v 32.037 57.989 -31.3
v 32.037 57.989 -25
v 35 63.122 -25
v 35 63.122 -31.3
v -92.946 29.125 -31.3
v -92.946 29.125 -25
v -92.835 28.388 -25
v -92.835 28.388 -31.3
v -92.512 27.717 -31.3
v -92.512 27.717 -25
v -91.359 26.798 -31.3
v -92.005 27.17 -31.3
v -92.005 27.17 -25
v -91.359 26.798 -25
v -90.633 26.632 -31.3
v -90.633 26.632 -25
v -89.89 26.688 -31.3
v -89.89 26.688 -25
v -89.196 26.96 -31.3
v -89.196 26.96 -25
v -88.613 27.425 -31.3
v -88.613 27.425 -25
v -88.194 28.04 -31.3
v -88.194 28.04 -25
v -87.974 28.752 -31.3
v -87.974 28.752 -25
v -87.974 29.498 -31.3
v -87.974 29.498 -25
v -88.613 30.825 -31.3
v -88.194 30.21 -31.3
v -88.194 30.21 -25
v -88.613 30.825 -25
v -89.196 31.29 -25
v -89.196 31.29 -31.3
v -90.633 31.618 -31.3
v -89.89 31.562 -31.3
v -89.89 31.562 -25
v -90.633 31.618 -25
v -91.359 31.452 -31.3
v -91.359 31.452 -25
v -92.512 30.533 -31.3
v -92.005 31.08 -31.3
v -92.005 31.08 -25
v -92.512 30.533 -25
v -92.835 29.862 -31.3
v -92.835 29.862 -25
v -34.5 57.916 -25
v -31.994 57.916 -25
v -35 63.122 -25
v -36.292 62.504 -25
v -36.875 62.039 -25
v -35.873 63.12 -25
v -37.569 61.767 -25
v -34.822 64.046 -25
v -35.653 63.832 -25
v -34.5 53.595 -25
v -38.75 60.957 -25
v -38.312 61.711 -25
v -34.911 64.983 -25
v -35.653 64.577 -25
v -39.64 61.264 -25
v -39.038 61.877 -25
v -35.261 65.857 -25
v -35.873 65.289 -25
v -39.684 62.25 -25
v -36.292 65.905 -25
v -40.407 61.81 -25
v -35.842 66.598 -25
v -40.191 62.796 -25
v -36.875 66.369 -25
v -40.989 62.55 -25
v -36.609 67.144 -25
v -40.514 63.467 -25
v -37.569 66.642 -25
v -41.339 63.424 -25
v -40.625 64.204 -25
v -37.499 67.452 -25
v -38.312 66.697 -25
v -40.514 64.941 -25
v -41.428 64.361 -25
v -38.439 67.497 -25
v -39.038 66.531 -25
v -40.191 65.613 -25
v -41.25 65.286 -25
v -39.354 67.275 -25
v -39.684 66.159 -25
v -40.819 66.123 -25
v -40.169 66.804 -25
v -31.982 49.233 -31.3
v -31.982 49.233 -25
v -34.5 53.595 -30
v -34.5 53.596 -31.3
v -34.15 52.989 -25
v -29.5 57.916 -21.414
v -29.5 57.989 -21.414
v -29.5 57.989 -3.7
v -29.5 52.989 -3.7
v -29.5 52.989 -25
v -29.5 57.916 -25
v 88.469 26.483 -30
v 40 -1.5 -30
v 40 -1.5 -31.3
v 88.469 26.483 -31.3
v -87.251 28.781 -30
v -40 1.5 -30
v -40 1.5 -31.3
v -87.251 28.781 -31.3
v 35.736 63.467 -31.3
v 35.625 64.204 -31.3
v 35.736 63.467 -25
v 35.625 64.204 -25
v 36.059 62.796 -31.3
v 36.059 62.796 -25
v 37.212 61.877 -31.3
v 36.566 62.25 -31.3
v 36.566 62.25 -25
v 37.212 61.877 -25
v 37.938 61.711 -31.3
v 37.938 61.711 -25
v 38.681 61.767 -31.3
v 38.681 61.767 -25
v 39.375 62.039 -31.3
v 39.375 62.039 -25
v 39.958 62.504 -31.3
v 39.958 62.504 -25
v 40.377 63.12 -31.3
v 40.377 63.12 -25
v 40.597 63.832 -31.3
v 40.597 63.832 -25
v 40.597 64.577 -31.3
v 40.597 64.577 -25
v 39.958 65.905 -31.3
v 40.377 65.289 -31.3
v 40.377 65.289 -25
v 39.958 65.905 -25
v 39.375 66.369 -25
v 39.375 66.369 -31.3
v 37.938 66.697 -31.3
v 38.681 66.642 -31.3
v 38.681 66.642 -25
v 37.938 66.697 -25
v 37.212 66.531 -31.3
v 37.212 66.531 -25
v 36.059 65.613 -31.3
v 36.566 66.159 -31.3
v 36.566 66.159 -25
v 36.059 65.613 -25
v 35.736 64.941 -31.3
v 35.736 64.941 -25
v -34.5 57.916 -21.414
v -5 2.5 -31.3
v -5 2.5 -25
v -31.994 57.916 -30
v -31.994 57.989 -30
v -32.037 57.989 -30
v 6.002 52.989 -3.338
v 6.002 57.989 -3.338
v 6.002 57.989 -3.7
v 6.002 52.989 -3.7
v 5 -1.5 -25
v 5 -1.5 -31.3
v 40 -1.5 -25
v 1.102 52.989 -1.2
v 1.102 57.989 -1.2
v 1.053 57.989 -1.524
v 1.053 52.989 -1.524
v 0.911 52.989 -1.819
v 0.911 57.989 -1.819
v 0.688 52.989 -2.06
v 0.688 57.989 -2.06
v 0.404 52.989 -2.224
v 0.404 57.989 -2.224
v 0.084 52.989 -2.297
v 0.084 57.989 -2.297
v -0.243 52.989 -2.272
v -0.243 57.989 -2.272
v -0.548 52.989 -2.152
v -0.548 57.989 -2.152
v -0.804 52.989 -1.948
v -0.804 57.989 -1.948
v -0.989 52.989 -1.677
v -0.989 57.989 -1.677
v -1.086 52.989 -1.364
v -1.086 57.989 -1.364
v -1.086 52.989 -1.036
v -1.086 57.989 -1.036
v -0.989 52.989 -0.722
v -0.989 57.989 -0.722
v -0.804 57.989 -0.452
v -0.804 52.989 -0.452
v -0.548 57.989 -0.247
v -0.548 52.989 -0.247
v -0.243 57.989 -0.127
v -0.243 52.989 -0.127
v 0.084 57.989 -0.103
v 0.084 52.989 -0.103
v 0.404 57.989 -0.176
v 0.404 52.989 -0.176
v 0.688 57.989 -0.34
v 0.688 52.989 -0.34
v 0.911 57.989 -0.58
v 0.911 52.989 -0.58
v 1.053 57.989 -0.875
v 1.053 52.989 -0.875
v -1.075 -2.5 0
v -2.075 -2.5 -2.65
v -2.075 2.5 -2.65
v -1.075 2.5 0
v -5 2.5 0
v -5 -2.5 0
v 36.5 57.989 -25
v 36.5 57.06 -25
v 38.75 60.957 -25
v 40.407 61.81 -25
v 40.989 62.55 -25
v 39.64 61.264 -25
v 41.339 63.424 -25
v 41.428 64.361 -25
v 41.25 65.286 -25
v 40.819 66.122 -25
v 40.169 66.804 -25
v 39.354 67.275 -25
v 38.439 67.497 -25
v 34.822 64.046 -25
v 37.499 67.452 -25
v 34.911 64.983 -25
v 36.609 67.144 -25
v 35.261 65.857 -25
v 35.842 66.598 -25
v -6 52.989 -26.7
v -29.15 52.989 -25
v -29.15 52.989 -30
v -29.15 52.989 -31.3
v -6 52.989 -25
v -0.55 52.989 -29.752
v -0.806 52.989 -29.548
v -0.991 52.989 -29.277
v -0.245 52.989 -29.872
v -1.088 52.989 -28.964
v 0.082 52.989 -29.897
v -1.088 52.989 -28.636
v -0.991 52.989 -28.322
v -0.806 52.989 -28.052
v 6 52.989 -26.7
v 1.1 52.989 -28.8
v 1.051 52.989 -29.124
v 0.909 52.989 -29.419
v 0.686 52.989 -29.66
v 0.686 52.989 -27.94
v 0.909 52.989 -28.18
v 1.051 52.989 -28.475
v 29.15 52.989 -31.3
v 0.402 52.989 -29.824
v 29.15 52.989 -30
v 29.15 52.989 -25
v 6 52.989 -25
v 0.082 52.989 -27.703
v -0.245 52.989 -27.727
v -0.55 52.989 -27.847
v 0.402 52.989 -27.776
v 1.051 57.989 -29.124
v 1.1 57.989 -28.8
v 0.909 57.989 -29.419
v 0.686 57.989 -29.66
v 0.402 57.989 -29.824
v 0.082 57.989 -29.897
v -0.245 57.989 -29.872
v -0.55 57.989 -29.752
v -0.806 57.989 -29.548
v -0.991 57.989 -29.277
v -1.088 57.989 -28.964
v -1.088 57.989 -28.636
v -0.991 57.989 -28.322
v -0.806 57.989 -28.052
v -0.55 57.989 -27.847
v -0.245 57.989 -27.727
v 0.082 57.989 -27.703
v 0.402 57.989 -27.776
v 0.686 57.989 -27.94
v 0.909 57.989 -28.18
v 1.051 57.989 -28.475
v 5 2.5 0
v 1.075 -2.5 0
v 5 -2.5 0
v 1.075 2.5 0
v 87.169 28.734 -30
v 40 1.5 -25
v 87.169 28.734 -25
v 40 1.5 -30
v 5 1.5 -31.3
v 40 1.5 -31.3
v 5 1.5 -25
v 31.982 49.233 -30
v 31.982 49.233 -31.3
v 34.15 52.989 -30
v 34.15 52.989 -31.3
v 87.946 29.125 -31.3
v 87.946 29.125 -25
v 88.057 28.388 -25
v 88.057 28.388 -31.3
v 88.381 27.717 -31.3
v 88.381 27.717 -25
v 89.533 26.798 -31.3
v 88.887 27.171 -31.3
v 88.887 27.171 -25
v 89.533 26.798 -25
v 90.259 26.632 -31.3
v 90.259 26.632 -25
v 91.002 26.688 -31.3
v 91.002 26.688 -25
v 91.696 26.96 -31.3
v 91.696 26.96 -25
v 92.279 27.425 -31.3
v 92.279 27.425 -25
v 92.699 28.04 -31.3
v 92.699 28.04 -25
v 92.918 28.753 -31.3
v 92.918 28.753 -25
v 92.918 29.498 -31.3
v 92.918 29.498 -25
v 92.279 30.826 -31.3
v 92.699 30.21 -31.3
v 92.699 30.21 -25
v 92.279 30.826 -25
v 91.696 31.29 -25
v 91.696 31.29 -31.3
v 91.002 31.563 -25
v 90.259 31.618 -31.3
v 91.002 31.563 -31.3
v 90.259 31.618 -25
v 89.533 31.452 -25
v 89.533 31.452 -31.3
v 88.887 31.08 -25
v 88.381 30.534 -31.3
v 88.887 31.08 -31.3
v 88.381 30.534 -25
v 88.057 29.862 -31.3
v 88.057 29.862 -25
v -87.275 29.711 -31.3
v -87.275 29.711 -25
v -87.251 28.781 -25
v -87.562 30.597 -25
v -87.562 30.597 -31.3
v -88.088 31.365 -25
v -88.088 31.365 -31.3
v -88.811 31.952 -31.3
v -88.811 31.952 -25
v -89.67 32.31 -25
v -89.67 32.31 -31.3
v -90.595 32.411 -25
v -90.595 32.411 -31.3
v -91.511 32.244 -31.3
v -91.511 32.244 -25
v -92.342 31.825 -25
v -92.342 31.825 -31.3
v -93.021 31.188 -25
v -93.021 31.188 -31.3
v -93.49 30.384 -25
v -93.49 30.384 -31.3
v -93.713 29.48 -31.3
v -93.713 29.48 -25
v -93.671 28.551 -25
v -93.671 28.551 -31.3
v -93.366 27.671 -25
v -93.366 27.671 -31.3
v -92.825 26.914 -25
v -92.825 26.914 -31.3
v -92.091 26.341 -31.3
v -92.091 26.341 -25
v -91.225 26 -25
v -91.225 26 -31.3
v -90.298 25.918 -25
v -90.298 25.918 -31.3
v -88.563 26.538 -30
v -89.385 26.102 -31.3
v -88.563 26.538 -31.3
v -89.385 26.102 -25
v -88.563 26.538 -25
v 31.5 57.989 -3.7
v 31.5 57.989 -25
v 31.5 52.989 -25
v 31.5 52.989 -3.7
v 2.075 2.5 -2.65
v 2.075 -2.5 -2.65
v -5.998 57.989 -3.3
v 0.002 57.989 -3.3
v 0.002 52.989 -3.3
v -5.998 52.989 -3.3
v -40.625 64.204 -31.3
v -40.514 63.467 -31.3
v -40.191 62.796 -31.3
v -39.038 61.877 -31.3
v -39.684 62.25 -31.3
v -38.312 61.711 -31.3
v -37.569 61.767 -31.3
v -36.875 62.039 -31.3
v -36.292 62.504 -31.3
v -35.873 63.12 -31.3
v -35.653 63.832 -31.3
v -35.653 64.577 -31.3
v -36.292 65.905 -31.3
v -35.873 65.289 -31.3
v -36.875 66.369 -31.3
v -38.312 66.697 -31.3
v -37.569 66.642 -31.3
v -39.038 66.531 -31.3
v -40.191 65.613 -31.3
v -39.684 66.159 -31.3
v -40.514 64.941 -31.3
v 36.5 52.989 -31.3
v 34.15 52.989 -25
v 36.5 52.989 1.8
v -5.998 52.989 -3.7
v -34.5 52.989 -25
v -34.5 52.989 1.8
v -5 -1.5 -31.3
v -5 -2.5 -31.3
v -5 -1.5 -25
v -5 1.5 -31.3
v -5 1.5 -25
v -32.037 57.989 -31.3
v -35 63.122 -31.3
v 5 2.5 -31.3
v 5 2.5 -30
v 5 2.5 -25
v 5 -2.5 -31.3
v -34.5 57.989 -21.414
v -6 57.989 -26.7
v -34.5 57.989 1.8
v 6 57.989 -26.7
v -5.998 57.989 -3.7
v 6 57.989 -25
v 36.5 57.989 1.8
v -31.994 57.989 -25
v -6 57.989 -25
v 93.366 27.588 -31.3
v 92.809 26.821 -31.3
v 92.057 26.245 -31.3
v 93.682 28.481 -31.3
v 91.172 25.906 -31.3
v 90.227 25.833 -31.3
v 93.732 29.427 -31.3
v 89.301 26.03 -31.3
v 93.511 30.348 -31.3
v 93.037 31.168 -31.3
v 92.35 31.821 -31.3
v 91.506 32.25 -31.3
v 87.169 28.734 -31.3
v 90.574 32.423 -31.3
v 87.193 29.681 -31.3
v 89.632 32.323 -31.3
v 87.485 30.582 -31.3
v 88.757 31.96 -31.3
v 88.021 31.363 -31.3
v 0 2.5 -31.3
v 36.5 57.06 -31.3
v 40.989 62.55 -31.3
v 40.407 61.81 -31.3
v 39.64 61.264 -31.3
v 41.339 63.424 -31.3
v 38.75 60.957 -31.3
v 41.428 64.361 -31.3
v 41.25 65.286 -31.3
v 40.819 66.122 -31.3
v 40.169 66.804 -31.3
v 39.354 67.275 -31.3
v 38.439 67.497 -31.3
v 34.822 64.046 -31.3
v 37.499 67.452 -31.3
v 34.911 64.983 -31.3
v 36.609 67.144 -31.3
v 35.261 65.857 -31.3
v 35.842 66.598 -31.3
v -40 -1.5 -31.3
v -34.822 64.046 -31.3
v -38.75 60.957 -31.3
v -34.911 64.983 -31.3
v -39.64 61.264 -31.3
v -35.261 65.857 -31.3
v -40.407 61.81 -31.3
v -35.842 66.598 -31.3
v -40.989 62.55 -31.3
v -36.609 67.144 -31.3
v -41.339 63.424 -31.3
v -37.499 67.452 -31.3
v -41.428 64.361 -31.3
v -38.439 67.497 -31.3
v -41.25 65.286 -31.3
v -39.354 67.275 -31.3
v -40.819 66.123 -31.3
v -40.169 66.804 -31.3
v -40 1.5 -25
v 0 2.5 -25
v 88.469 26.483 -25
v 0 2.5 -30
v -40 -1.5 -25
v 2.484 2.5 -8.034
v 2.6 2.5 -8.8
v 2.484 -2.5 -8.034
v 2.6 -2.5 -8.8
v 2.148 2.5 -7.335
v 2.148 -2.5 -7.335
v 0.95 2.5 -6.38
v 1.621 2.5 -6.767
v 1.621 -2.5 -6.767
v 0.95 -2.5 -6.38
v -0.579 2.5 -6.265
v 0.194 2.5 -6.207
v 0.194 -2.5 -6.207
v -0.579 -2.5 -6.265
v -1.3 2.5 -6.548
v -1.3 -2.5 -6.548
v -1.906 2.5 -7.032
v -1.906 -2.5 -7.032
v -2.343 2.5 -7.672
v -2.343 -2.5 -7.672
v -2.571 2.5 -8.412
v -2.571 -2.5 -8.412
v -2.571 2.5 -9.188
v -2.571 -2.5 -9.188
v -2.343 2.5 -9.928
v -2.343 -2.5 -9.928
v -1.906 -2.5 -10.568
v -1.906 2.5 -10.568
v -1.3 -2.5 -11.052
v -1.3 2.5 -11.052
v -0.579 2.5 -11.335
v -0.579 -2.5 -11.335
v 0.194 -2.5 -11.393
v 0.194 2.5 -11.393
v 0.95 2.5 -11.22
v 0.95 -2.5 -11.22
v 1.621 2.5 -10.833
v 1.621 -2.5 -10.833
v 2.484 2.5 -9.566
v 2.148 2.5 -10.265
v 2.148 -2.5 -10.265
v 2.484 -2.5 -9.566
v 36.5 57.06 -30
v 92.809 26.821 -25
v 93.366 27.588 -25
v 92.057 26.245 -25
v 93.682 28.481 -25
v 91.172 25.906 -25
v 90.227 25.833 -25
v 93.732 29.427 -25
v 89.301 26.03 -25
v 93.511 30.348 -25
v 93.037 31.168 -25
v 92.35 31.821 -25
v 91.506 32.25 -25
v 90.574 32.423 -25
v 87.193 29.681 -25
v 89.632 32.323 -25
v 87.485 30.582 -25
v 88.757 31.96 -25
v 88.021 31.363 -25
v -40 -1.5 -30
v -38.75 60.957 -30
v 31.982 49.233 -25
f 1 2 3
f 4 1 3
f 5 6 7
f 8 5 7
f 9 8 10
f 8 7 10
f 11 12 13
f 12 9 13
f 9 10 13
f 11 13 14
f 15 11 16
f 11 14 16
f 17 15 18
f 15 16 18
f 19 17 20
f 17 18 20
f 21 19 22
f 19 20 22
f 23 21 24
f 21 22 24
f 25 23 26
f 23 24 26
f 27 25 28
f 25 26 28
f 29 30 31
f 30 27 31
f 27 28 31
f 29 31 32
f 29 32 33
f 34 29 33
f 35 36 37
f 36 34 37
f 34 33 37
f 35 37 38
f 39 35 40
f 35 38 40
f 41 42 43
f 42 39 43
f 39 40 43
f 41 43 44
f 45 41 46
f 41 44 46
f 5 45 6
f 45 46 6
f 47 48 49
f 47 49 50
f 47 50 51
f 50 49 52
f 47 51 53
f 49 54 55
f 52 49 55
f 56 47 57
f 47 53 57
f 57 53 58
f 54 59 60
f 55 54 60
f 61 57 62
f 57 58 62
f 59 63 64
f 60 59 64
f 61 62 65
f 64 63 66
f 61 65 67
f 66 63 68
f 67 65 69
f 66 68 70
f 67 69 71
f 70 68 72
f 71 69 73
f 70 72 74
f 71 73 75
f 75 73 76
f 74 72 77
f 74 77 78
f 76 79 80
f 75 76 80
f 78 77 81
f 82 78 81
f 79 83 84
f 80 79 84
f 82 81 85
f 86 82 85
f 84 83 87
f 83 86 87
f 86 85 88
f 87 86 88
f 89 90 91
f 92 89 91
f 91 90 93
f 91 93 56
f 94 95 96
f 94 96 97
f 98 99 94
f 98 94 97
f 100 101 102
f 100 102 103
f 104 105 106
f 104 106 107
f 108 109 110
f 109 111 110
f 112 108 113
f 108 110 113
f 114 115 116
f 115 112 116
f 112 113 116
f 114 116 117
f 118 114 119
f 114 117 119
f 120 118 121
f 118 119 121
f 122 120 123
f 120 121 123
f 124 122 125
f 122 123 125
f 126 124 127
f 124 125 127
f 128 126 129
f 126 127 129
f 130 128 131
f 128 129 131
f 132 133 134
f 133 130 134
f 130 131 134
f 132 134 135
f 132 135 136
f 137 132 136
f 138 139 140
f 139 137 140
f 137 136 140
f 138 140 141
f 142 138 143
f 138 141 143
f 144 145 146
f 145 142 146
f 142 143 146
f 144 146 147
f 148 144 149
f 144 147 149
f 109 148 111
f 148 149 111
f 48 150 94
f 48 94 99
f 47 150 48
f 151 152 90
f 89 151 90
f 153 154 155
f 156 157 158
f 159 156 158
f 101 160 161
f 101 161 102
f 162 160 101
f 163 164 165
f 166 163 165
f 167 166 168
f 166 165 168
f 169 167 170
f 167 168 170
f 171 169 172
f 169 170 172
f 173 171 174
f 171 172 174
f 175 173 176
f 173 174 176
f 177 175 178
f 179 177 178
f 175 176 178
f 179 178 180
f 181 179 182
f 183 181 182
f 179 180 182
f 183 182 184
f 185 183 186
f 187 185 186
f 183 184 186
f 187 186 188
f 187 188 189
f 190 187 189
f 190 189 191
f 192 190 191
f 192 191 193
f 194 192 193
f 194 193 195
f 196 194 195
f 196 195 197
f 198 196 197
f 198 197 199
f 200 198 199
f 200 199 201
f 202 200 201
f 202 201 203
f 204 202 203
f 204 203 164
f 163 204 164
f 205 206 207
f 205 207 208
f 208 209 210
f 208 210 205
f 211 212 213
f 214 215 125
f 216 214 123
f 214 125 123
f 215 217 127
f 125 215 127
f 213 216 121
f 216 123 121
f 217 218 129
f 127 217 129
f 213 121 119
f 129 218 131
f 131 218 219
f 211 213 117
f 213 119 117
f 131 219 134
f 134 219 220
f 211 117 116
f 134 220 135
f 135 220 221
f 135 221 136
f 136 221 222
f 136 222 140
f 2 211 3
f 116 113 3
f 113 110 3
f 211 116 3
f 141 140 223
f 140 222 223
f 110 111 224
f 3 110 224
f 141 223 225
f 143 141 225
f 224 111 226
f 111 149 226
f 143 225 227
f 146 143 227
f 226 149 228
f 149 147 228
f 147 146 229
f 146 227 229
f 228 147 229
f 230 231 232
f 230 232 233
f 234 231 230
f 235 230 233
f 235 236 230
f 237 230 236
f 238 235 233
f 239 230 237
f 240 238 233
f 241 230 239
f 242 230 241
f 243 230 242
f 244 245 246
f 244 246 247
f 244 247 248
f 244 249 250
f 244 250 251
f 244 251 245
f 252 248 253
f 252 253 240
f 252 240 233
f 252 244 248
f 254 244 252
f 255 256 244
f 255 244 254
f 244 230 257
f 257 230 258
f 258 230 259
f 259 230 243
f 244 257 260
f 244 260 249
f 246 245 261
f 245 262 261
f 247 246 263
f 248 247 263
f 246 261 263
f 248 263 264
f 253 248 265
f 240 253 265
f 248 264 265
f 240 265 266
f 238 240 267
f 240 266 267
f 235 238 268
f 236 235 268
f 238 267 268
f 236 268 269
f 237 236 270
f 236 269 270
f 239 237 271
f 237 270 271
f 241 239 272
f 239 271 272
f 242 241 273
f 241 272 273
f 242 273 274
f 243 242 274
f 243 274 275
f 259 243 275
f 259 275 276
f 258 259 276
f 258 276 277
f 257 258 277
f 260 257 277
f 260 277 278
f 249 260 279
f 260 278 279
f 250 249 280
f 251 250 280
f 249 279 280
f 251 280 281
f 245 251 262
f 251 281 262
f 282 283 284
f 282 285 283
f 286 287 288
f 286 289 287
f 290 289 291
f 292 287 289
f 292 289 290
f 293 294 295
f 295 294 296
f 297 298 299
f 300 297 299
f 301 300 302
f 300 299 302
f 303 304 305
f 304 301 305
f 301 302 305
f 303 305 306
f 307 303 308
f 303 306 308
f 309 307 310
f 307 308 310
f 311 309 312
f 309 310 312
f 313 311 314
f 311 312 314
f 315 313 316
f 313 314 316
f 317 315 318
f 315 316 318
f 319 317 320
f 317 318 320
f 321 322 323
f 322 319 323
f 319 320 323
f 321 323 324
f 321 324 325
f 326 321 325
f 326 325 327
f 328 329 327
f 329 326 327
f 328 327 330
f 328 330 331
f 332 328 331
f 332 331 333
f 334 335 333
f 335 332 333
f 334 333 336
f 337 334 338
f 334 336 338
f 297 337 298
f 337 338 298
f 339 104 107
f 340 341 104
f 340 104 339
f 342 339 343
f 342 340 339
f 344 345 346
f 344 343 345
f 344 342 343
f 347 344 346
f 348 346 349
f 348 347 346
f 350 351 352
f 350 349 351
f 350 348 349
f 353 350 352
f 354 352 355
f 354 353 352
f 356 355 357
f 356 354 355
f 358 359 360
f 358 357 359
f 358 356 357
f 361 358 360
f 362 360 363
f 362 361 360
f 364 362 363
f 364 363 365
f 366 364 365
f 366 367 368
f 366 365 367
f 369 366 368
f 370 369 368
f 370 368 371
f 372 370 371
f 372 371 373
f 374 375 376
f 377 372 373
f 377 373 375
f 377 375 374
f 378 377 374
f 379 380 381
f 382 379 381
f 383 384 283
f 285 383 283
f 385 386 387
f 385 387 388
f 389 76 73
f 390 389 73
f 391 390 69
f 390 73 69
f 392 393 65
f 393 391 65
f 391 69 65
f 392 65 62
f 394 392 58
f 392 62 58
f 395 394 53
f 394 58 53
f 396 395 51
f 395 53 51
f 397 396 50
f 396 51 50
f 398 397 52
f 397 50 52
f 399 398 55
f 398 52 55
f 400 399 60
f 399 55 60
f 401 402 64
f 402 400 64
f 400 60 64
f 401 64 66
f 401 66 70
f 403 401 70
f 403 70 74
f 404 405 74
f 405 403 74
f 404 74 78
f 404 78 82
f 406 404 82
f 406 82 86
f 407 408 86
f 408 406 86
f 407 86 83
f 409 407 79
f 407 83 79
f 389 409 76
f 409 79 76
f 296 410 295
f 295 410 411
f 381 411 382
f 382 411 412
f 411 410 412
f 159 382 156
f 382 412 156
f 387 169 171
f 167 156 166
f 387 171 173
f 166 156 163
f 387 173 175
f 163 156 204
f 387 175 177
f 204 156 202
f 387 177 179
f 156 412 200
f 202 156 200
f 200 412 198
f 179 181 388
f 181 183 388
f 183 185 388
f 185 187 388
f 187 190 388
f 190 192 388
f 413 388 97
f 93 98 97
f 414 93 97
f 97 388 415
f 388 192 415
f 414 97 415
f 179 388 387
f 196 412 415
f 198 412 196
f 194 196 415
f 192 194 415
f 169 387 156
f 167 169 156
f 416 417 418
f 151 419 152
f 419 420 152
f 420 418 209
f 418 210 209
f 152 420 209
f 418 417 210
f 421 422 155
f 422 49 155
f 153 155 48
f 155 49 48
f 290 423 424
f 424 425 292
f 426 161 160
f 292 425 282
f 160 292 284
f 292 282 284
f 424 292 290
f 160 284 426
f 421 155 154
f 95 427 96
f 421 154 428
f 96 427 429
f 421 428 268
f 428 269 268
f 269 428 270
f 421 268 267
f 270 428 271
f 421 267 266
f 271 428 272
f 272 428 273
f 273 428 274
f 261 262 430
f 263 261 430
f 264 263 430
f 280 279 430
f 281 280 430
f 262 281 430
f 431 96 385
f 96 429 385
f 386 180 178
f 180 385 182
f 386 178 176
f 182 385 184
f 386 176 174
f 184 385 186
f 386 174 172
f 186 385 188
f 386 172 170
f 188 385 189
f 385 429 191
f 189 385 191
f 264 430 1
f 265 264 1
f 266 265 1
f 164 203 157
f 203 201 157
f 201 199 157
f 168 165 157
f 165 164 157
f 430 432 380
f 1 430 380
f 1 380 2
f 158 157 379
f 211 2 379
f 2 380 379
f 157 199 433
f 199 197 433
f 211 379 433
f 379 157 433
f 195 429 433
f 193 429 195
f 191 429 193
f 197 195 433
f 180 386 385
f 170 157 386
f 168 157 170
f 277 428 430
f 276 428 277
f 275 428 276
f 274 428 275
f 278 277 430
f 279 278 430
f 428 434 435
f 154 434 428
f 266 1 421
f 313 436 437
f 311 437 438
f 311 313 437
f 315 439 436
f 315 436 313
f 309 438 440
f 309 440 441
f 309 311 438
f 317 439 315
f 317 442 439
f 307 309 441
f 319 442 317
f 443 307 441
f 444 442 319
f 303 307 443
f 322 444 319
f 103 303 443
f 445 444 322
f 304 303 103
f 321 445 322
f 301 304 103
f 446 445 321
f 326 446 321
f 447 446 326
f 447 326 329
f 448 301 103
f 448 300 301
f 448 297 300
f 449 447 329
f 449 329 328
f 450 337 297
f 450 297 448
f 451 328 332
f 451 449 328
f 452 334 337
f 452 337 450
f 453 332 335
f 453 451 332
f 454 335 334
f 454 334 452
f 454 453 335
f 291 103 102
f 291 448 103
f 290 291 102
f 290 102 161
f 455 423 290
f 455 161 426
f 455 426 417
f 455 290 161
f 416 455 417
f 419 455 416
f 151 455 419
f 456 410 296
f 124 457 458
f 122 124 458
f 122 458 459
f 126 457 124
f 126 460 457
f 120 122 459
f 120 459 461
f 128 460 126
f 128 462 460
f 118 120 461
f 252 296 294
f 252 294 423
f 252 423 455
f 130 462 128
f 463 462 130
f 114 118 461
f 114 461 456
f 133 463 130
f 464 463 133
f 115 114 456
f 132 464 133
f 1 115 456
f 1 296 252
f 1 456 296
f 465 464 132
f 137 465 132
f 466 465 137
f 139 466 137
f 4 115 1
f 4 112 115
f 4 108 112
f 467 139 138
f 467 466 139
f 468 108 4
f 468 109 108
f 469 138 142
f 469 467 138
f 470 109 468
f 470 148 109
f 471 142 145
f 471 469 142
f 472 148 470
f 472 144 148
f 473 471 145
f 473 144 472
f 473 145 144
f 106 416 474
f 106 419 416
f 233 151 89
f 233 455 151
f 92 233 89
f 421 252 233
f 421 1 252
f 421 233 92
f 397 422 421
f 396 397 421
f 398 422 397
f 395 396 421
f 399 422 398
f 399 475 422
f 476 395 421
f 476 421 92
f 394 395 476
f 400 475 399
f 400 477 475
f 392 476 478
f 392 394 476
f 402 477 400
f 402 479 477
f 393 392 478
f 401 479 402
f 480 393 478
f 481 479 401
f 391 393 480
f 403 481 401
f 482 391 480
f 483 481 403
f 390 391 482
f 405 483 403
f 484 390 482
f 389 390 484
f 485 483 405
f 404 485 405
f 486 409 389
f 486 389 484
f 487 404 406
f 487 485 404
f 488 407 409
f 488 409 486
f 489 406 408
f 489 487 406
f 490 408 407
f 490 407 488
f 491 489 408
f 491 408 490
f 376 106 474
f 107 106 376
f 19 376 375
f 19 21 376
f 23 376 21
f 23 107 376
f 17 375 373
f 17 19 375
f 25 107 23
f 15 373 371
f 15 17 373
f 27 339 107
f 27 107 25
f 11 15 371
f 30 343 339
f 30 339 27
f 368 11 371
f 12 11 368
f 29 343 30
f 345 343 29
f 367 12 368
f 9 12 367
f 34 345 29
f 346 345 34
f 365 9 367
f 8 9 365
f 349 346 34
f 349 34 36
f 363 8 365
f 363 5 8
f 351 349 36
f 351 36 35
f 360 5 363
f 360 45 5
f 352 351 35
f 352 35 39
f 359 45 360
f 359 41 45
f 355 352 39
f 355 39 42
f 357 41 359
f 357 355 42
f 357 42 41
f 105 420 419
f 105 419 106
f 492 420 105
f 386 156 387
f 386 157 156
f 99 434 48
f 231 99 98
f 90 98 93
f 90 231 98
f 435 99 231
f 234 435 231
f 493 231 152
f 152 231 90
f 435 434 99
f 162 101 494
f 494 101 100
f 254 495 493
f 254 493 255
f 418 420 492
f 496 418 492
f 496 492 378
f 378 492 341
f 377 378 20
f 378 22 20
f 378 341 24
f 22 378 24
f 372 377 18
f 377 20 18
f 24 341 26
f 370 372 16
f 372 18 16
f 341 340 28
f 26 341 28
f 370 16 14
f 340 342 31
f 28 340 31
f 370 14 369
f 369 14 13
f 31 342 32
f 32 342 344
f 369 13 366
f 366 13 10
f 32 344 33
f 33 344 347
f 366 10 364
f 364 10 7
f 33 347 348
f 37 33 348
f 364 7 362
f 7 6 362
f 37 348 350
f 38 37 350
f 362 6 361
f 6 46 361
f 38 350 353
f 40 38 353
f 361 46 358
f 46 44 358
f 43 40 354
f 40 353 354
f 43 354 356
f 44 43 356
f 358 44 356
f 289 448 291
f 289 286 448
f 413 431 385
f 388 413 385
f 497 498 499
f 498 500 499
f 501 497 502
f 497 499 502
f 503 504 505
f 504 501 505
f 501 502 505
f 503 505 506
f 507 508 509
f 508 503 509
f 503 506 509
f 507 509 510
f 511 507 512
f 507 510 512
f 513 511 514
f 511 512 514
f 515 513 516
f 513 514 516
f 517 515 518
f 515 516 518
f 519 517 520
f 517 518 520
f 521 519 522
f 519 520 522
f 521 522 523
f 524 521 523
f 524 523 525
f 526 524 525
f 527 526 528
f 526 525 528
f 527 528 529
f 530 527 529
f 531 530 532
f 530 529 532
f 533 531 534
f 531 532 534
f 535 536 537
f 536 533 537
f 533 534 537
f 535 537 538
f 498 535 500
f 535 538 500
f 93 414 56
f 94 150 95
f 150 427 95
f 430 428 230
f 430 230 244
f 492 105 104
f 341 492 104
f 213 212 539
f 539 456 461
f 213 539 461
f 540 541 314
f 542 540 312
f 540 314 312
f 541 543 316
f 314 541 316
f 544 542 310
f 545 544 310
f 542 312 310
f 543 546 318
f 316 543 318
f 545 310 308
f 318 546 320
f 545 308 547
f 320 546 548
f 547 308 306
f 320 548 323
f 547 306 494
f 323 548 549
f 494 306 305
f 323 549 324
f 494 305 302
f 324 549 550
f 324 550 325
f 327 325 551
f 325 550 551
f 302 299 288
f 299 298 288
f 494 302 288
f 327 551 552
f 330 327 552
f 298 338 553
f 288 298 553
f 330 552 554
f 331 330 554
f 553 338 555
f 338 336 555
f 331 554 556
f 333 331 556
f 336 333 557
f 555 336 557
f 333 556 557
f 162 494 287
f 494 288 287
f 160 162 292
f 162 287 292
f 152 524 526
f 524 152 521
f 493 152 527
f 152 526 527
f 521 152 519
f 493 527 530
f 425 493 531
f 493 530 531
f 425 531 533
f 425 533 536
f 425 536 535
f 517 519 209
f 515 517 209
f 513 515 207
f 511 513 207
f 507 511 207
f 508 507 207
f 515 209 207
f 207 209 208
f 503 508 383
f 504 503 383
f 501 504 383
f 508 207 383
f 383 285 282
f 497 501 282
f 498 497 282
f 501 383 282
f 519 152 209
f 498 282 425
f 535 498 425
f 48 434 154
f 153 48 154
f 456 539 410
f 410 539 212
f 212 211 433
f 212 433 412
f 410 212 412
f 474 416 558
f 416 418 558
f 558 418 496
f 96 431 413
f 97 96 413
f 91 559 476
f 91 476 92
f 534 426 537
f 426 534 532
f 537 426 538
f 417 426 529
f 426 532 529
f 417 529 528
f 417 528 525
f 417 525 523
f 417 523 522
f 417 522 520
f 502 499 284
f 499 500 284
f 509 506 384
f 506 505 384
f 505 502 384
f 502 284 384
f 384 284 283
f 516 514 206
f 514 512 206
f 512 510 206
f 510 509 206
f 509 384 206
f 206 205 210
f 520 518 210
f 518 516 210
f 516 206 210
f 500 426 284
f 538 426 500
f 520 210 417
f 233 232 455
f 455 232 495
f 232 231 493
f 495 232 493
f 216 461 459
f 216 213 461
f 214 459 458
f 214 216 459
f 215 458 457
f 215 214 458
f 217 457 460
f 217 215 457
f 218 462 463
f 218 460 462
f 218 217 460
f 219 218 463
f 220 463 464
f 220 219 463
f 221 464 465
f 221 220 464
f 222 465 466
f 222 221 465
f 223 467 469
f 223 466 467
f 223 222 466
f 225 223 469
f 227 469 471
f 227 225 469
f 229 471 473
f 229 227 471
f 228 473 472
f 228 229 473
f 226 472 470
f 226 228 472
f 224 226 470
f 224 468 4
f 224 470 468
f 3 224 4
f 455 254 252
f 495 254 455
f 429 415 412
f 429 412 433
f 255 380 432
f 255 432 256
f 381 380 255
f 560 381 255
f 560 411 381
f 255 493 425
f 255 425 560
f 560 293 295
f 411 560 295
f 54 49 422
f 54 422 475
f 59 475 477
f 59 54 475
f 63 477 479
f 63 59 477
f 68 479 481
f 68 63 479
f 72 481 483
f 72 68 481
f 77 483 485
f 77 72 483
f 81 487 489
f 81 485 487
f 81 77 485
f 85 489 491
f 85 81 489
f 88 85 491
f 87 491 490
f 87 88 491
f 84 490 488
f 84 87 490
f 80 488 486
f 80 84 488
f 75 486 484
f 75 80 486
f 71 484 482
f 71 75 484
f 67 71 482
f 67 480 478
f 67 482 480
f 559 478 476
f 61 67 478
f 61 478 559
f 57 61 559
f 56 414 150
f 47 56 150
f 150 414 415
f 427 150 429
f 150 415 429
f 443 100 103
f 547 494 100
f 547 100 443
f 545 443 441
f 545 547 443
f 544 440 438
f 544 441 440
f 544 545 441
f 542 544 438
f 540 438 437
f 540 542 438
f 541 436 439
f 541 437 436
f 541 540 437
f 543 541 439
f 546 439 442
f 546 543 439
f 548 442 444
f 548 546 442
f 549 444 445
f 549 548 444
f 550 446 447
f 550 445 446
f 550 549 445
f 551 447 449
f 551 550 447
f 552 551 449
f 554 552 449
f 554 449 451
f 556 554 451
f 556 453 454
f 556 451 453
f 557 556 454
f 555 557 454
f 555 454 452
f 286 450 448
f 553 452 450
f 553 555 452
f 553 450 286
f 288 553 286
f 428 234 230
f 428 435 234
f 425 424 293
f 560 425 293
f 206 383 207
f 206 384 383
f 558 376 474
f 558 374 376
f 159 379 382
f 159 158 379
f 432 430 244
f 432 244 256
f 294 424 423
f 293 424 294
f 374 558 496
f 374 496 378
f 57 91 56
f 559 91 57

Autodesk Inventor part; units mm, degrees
ref_plane "XZ Plane" through (0, 0, 0) normal (0, 1, 0) x (-1, 0, 0)
ref_plane "XY Plane" through (0, 0, 0) normal (0, 0, 1) x (1, 0, 0)
sketch "Sketch1" plane through (0, 0, 0) normal (0, 0, 1) x (1, 0, 0)
  line L0 (5, -2.5) -> (-5, -2.5)
  line L1 (-5, -2.5) -> (-5, 2.5)
  line L2 (-5, 2.5) -> (5, 2.5)
  line L3 (5, 2.5) -> (5, -2.5)
  line L4 (5, -2.5) -> (-5, 2.5) construction
  line L5 (-5, -2.5) -> (5, 2.5) construction
  point P0 (0, 0)
  dimension "d0" = 10
  dimension "d1" = 5
extrude "Extrusion1" add sketch "Sketch1" against normal blind 30
sketch "Sketch2" plane through (0, 0, 0) normal (0, 1, 0) x (-1, 0, 0)
  line L0 (0, 0) -> (0, -2.65)
  line L1 (0, -2.65) -> (2.075, -2.65)
  line L2 (0, -2.65) -> (-2.075, -2.65)
  line L3 (0, 0) -> (-1.075, 0)
  line L4 (-5, 0) -> (5, 0) projected
  line L5 (0, 0) -> (1.075, 0)
  line L6 (2.075, -2.65) -> (1.075, 0)
  line L7 (-2.075, -2.65) -> (-1.075, 0)
  point P0 (-0.025, -2.7)
  dimension "d13" = 2.075
  dimension "d74" = 2.075
  dimension "d75" = 1.075
  dimension "d76" = 1.075
  dimension "d77" = 2.65
extrude "Extrusion2" cut sketch "Sketch2" along normal through all both and the other way through all
sketch "Sketch3" plane through (0, 0, -30) normal (0, 0, -1) x (-1, 0, 0)
  line L0 (5, -2.5) -> (5, 2.5) projected
  line L1 (5, 0) -> (5, 1.5)
  line L2 (5, 1.5) -> (40, 1.5)
  line L3 (5, 1.5) -> (40, 1.5) construction
  line L4 (40, 1.5) -> (40, -1.5)
  line L5 (40, -1.5) -> (5, -1.5)
  line L6 (5, 1.5) -> (5, -1.5)
  line L7 (-5, 2.5) -> (-5, -2.5) projected
  line L8 (-5, -1.5) -> (-5, 1.5)
  line L9 (-5, 0) -> (-5, 1.5)
  line L10 (-5, 0) -> (-5, -1.5)
  line L11 (-40, -1.5) -> (-40, 1.5004)
  line L12 (-40, 1.5004) -> (-5, 1.5)
  line L13 (-5, 0) -> (-5, -1.5)
  line L14 (-5, -1.5) -> (-40, -1.5)
  point P0 (0, 0)
  point P1 (5, 0)
  dimension "d17" = 35
  dimension "d19" = 3
  dimension "d26" = 1.5
  dimension "d28" = 1.5
  dimension "d29" = 35
  dimension "d30" = 35
  dimension "d31" = 1.5
extrude "Extrusion3" add sketch "Sketch3" against normal blind 5
sketch "Sketch4" plane through (0, 0, -30) normal (0, 0, -1) x (-1, 0, 0)
  line L0 (40, -1.5) -> (40, 1.5) projected
  line L1 (40, -1.5) -> (97.5, -1.5) construction
  line L2 (40, 1.5) -> (5, 1.5) projected
  line L3 (40, 1.5) -> (87.6314, 29)
  line L4 (40, 1.5) -> (95, 1.5) construction
  line L5 (5, -1.5) -> (40, -1.5) projected
  line L6 (40, -1.5) -> (88.9304, 26.75)
  line L7 (88.9304, 26.75) -> (87.6314, 29)
  line L8 (-5, -1.5) -> (-40, -1.5) projected
  line L9 (-40, -1.5) -> (-88.9306, 26.7501)
  line L10 (-40, -1.5) -> (18, -1.5) construction
  line L11 (-40, 1.5004) -> (-5, 1.5) projected
  line L12 (-40, 1.5004) -> (-87.6314, 29.0004)
  line L13 (-40, 1.5004) -> (15, 1.5004) construction
  line L14 (-87.6314, 29.0004) -> (-88.9306, 26.7501)
  line L15 (87.6314, 29) -> (88.2809, 27.875)
  line L16 (88.2809, 27.875) -> (90.446, 29.125)
  line L17 (88.2809, 27.875) -> (90.7809, 27.875) construction
  circle A0 centre (90.446, 29.125) radius 2.5
  arc A1 (88.5627, 26.5377) -> (87.2514, 28.7806) centre (90.4788, 29.1627) ccw
  line L18 (-88.281, 27.8752) -> (-90.4461, 29.1252)
  line L19 (-88.281, 27.8752) -> (-85.781, 27.8752) construction
  circle A2 centre (-90.4461, 29.1252) radius 2.5
  arc A3 (-87.1694, 28.7337) -> (-88.4686, 26.4834) centre (-90.4461, 29.1252) ccw
  line L20 (5, 2.5) -> (-5, 2.5) projected
  line L21 (0, 2.5) -> (-35, 63.1218)
  line L22 (0, 2.5) -> (70, 2.5) construction
  line L23 (0, 2.5) -> (35, 63.1218)
  line L24 (0, 2.5) -> (70, 2.5) construction
  line L25 (-5, 2.5) -> (-38.75, 60.9567)
  line L26 (-5, 2.5) -> (68.5, 2.5) construction
  line L27 (5, 2.5) -> (38.75, 60.9567)
  line L28 (5, 2.5) -> (73.5, 2.5) construction
  line L29 (-35, 63.1218) -> (-38.75, 60.9567)
  line L30 (35, 63.1218) -> (38.75, 60.9567)
  line L31 (-36.875, 62.0392) -> (-38.125, 64.2043)
  circle A4 centre (-38.125, 64.2043) radius 2.5
  line L32 (36.875, 62.0392) -> (38.125, 64.2043)
  circle A5 centre (38.125, 64.2043) radius 2.5
  line L33 (-40, -1.5) -> (-40, 1.5004) projected
  line L34 (-40, 1.5004) -> (-40, -1.5)
  line L35 (40, 1.5) -> (40, -1.5)
  line L36 (-5, 2.5) -> (-5, 1.5) projected
  line L37 (-5, 2.5) -> (0, 2.5)
  line L38 (0, 2.5) -> (5, 2.5)
  arc A6 (38.75, 60.9567) -> (35, 63.1218) centre (38.125, 64.2043) ccw
  arc A7 (-35, 63.1218) -> (-38.75, 60.9567) centre (-38.125, 64.2043) ccw
  point P0 (0, 0)
  dimension "d58" = 5
  dimension "d34" = 55
  dimension "d35" = 30
  dimension "d38" = 150
  dimension "d39" = 55
  dimension "d40" = 150
  dimension "d41" = 2.5
  dimension "d42" = 30
  dimension "d43" = 0.8
  dimension "d44" = 2.5
  dimension "d45" = 150
  dimension "d46" = 0.8
  dimension "d47" = 120
  dimension "d48" = 60
  dimension "d49" = 70
  dimension "d50" = 70
  dimension "d52" = 120
  dimension "d54" = 60
  dimension "d55" = 2.5
  dimension "d59" = 2.5
extrude "Extrusion4" add sketch "Sketch4" against normal blind 5
sketch "Sketch5" plane through (-5, -2.5, -30) normal (0, -1, 0) x (1, 0, 0)
  line L0 (0, 5) -> (0, 0) projected
  line L1 (0, 0) -> (0, 21.2)
  line L2 (0, 30) -> (0, 5) projected
  line L3 (0, 21.2) -> (1.9, 21.2) construction
  line L4 (0, 21.2) -> (1.9, 21.2) construction
  line L5 (1.9, 21.2) -> (5, 21.2)
  line L6 (2.95, 23.25) -> (7.05, 19.15) construction
  line L7 (7.05, 23.25) -> (2.95, 19.15) construction
  circle A0 centre (5, 21.2) radius 2.6
  line L8 (5, 21.2) -> (0, 21.2)
  point P0 (5, 30)
  dimension "d64" = 21.2
  dimension "d66" = 0
  dimension "d69" = 4.1
  dimension "d70" = 4.1
  dimension "d78" = 5.2
  dimension "d79" = 5
extrude "Extrusion5" cut sketch "Sketch5" against normal through all
ref_plane "Work Plane1" through (-32, 0, 0) normal (1, 0, 0) x (0, 1, 0)
sketch "Sketch6" plane through (-32, 0, 0) normal (1, 0, 0) x (0, 1, 0)
  line L0 (0, 0) -> (0, -25)
  line L1 (-1.5, -25) -> (1.5, -25) projected
  line L2 (0, -25) -> (49.2334, -25)
  line L3 (63.1218, -25) -> (2.5, -25) projected
  line L4 (49.2334, -25) -> (49.2334, -21.4137)
  line L5 (49.2334, -21.4137) -> (57.9156, -21.4137)
  line L6 (57.9156, -21.4137) -> (57.9156, -25)
extrude "Extrusion6" add sketch "Sketch6" along normal mid plane 5
sketch "Sketch7" plane through (-31.9816, 49.2334, -25) normal (0, 0, -1) x (-1, 0, 0)
  line L0 (2.5184, 8.6821) -> (-2.4816, 8.6821) projected
  line L1 (-2.4816, 0) -> (2.5184, 0) projected
  line L2 (2.5184, 8.6821) -> (2.5184, 0)
  line L3 (2.5184, 0) -> (-2.4816, 0)
  line L4 (-2.4816, 0) -> (-2.4816, 8.6821)
  line L5 (-2.4816, 8.6821) -> (2.5184, 8.6821)
  point P0 (-31.9816, -49.2334)
  dimension "d125" = 8.6821
extrude "Extrusion7" add sketch "Sketch7" along normal blind 5
sketch "Sketch8" plane through (-34.5, 49.2334, -21.4137) normal (0, 0, 1) x (1, 0, 0)
  line L0 (2.5184, 0) -> (0, 0) projected
  line L1 (5, 4.3621) -> (5, 0) projected
  line L2 (0, 0) -> (5, 0)
  line L3 (5, 0) -> (5, 8.7557)
  line L4 (5, 8.7557) -> (0, 8.7557)
  line L5 (0, 0) -> (0, 4.3621) projected
  line L6 (0, 8.7557) -> (0, 0)
  point P0 (34.5, -49.2334)
extrude "Extrusion8" add sketch "Sketch8" along normal blind 23.214
sketch "Sketch10" plane through (-29.5, 0, 0) normal (1, 0, 0) x (0, 0, -1)
  line L0 (25, 49.2334) -> (-1.8003, 49.2334) projected
  line L1 (-1.8003, 49.2334) -> (-1.8003, 57.9891) projected
  line L2 (-1.8003, 49.2334) -> (-1.8003, 57.9891)
  line L3 (-1.8003, 57.9891) -> (3.6997, 57.9891)
  line L4 (21.4137, 57.9891) -> (-1.8003, 57.9891) projected
  line L5 (3.6997, 57.9891) -> (3.6997, 49.2334)
  line L6 (3.6997, 49.2334) -> (-1.8003, 49.2334)
  line L7 (-1.8003, 57.9891) -> (-1.8003, 49.2334)
  point P0 (0, 0)
  dimension "d87" = 5.5
extrude "Extrusion9" add sketch "Sketch10" along normal blind 66
sketch "Sketch11" plane through (-29.5, 49.2334, -3.6997) normal (0, 0, -1) x (-1, 0, 0)
  line L0 (5, 0) -> (-66, 0) projected
  line L1 (-66, 8.7557) -> (-66, 0) projected
  line L2 (-66, 0) -> (-66, 8.7557)
  line L3 (-66, 8.7557) -> (-61, 8.7557)
  line L4 (-61, 8.7557) -> (-61, 0)
  line L5 (-61, 0) -> (-66, 0)
  point P0 (-29.5, -49.2334)
  point P1 (-61, 0)
  dimension "d90" = 5
  dimension "d124" = 8.7557
extrude "Extrusion10" add sketch "Sketch11" along normal up to surface (21.3003 mm away)
sketch "Sketch12" plane through (36.5, 49.2334, -25) normal (0, 0, -1) x (-1, 0, 0)
  line L0 (71, 8.7557) -> (0, 8.7557) projected
  line L1 (71, 0) -> (0, 0) projected
  line L2 (0, 8.7557) -> (0, 0) projected
  line L3 (0, 0) -> (0, 8.7557)
  line L4 (0, 8.7557) -> (5, 8.7557)
  line L5 (5, 8.7557) -> (5, 0)
  line L6 (0, 0) -> (5, 0)
  point P0 (36.5, -49.2334)
  dimension "d94" = 5
extrude "Extrusion11" add sketch "Sketch12" along normal up to surface (5 mm away)
sketch "Sketch13" plane through (-34.5, 57.9891, -21.4137) normal (0, 1, 0) x (1, 0, 0)
  line L0 (0, -23.214) -> (71, -23.214) projected
  line L1 (34.4572, -23.214) -> (37.4572, -23.214) construction
  line L2 (34.5022, -23.214) -> (34.5022, -20.214)
  line L3 (34.5022, -23.214) -> (37.5022, -23.214) construction
  circle A0 centre (34.5022, -20.214) radius 1.1
  dimension "d100" = 3
  dimension "d101" = 90
  dimension "d102" = 2.2
extrude "Extrusion12" cut sketch "Sketch13" against normal blind 11
sketch "Sketch14" plane through (-34.5, 57.9891, -21.4137) normal (0, 1, 0) x (1, 0, 0)
  circle A0 centre (34.5022, -20.214) radius 1.1 projected
  line L0 (34.5022, -20.214) -> (59.5022, -20.214) construction
  line L1 (34.5022, 5.886) -> (34.5022, 7.286)
  line L2 (5, 8.5863) -> (34.5, 8.5863) projected
  line L3 (34.5022, 5.886) -> (35.9022, 5.886) construction
  line L4 (66.5367, 3.5863) -> (71, 3.5863) projected
  line L5 (71, 7.286) -> (71, 3.5863)
  line L6 (0, 7.286) -> (0, 3.5863)
  line L7 (29.5, 3.5863) -> (-5.5, 3.5863) projected
  line L8 (34.5022, 3.686) -> (34.5022, 2.286)
  line L9 (34.5022, 3.686) -> (35.9022, 3.686) construction
  line L10 (34.5, 3.5863) -> (34.5, 8.5863) projected
  line L11 (66.5367, 8.5863) -> (66.5367, 3.5863) projected
  line L12 (2.5058, 3.5863) -> (2.5058, 8.5863) projected
  line L13 (66.5367, 3.5863) -> (2.5058, 3.5863)
  line L14 (2.5058, 3.5863) -> (2.5058, 8.5863)
  line L15 (29.5, 8.5863) -> (-5.5, 8.5863) projected
  line L16 (2.5058, 8.5863) -> (66.5367, 8.5863)
  line L17 (66.5367, 8.5863) -> (66.5367, 3.5863)
  point P0 (34.5, -21.4137)
  dimension "d108" = 1.4
  dimension "d109" = 90
  dimension "d111" = 1.4
  dimension "d112" = 90
extrude "Extrusion13" add sketch "Sketch14" against normal blind 5 contours L2 L10 L13 L7 L12 L15 | L16 L11 L13 L10
sketch "Sketch15" plane through (0, 0, -30) normal (0, 0, -1) x (-1, 0, 0)
  line L0 (0, 0) -> (0, -2.5)
  line L1 (-2.075, -2.5) -> (2.075, -2.5) projected
  line L2 (5, -2.5) -> (1.075, -2.5) projected
  line L3 (0, -2.5) -> (5, -2.5)
  line L4 (5, -2.5) -> (5, -1.5)
  line L5 (88.5627, 26.5377) -> (40, -1.5) projected
  line L6 (5, -1.5) -> (40, -1.5)
  line L7 (40, -1.5) -> (88.5627, 26.5377)
  line L8 (40, 1.5) -> (87.2514, 28.7806) projected
  line L9 (87.2514, 28.7806) -> (40, 1.5)
  line L10 (5, 1.5) -> (40, 1.5) projected
  line L11 (40, 1.5) -> (5, 1.5)
  line L12 (0, 2.5) -> (5, 2.5) projected
  line L13 (5, 1.5) -> (5, 2.5)
  line L14 (38.75, 60.9567) -> (34.5, 53.5955) projected
  line L15 (5, 2.5) -> (38.75, 60.9567)
  circle A0 centre (38.125, 64.2043) radius 2.5 projected
  arc A1 (38.75, 60.9567) -> (35, 63.1218) centre (38.125, 64.2043) ccw
  circle A2 centre (38.125, 64.2043) radius 2.5
  line L16 (35, 63.1218) -> (0, 2.5)
  line L17 (31.9942, 57.9156) -> (35, 63.1218) projected
  line L18 (-31.5, 57.0596) -> (0, 2.5) projected
  arc A3 (-35, 63.1218) -> (-38.75, 60.9567) centre (-38.125, 64.2043) ccw projected
  line L19 (0, 2.5) -> (-35, 63.1218)
  arc A4 (-35, 63.1218) -> (-38.75, 60.9567) centre (-38.125, 64.2043) ccw
  circle A5 centre (-38.125, 64.2043) radius 2.5
  line L20 (-5, 2.5) -> (-31.9816, 49.2334) projected
  line L21 (-38.75, 60.9567) -> (-5, 2.5)
  line L22 (-5, 2.5) -> (-5, 1.5)
  line L23 (-5, -2.5) -> (-5, 2.5) projected
  line L24 (-40, 1.5004) -> (-5, 1.5) projected
  line L25 (-5, 1.5) -> (-40, 1.5004)
  line L26 (-87.1694, 28.7337) -> (-40, 1.5004) projected
  line L27 (-40, 1.5004) -> (-87.1694, 28.7337)
  circle A6 centre (-90.4461, 29.1252) radius 2.5 projected
  circle A7 centre (-90.4461, 29.1252) radius 2.5
  line L28 (-40, -1.5) -> (-88.4686, 26.4834) projected
  arc A8 (-87.1694, 28.7337) -> (-88.4686, 26.4834) centre (-90.4461, 29.1252) ccw
  line L29 (-88.4686, 26.4834) -> (-40, -1.5)
  line L30 (-5, -1.5) -> (-40, -1.5) projected
  line L31 (-40, -1.5) -> (-5, -1.5)
  line L32 (-5, -1.5) -> (-5, -2.5)
  line L33 (-5, -2.5) -> (5, -2.5)
  line L34 (-5, 1.5) -> (5, 1.5)
  line L35 (-5, -1.5) -> (-5, 1.5) projected
  line L36 (-5, -1.5) -> (-5, 1.5)
  line L37 (5, -1.5) -> (5, 2.5)
  line L38 (40, -1.5) -> (88.5627, 26.5377)
  circle A9 centre (90.446, 29.125) radius 2.5 projected
  arc A10 (88.5627, 26.5377) -> (87.2514, 28.7806) centre (90.4788, 29.1627) ccw projected
  arc A11 (88.5627, 26.5377) -> (87.2514, 28.7806) centre (90.4788, 29.1627) ccw
  circle A12 centre (90.446, 29.125) radius 2.5
  dimension "d117" = 1
extrude "Extrusion14" add sketch "Sketch15" along normal blind 1.3
sketch "Sketch17" plane through (0, 0, -30) normal (0, 0, -1) x (-1, 0, 0)
  line L0 (34.5, 49.2334) -> (-36.5, 49.2334) projected
  line L1 (34.5, 49.2334) -> (34.5, 53.5961)
  line L2 (34.5, 53.5961) -> (31.9807, 49.2334)
  point P0 (0, 0)
extrude "Extrusion16" add sketch "Sketch17" along normal blind 1.3
sketch "Sketch18" plane through (36.5, 0, 0) normal (1, 0, 0) x (0, 0, -1)
  line L0 (30, 57.9891) -> (25, 57.9891) projected
  line L1 (25, 57.9891) -> (25, 52.9891)
  line L2 (25, 52.9891) -> (-2.8863, 52.9891)
  line L3 (-2.8863, 52.9891) -> (-2.8863, 45.156)
  line L4 (-2.8863, 45.156) -> (25, 45.156)
  line L5 (25, 2.5) -> (25, 49.2334) projected
  line L6 (25, 52.9891) -> (25, 45.156)
  line L7 (25, 57.9891) -> (25, 49.2334) projected
  point P0 (0, 0)
  point P1 (31.2997, 57.9891)
  point P2 (25, 57.0596)
  point P3 (31.3, 57.9891)
  dimension "d126" = 5
extrude "Extrusion17" cut sketch "Sketch18" against normal through all
sketch "Sketch20" plane through (0, 0, -30) normal (0, 0, -1) x (-1, 0, 0)
  line L0 (34.5, 57.9891) -> (-36.5, 57.9891) projected
  line L1 (29.1499, 52.9891) -> (31.9942, 57.9156) projected
  line L2 (32.0367, 57.9891) -> (29.1499, 52.9891)
  line L3 (-32.0367, 57.9891) -> (-29.1499, 52.9891) projected
  line L4 (29.1499, 52.9891) -> (-29.1499, 52.9891)
  line L5 (-29.1499, 52.9891) -> (-32.0367, 57.9891)
  line L6 (-32.0367, 57.9891) -> (32.0367, 57.9891)
  point P0 (0, 0)
extrude "Extrusion18" add sketch "Sketch20" along normal blind 1.3
sketch "Sketch21" plane through (-34.5, 57.9891, -21.4137) normal (0, 1, 0) x (1, 0, 0)
  circle A0 centre (34.5022, -20.214) radius 1.1 projected
  circle A1 centre (34.5, 7.386) radius 1.1
  point P0 (34.5, -21.4137)
  dimension "d133" = 2.2
extrude "Extrusion19" cut sketch "Sketch21" against normal blind 10 contours A1
sketch "Sketch22" plane through (-34.5, 57.9891, -21.4137) normal (0, 1, 0) x (1, 0, 0)
  circle A0 centre (34.5022, -20.214) radius 1.1 projected
  line L0 (34.5022, -19.114) -> (34.5022, -18.114)
  line L1 (66, -17.714) -> (5, -17.714) projected
  line L2 (34.5022, -19.114) -> (35.5022, -19.114) construction
  line L3 (34.5022, -18.114) -> (28.5021, -18.114)
  line L4 (5, -18.114) -> (5, -17.714)
  line L5 (5, -17.714) -> (66, -17.714)
  line L6 (66, -17.714) -> (66, -17.914)
  line L7 (40.5021, -18.0759) -> (34.5022, -18.114)
  line L8 (34.5022, -18.114) -> (40.5021, -18.0759)
  line L9 (40.5021, -18.0759) -> (40.5021, -17.714)
  line L10 (40.5021, -17.714) -> (28.5021, -17.714)
  line L11 (28.5021, -17.714) -> (28.5021, -18.114)
  point P0 (34.5, -21.4137)
  dimension "d136" = 1
  dimension "d137" = 90
  dimension "d149" = 6
  dimension "d150" = 12
extrude "Extrusion20" cut sketch "Sketch22" against normal blind 10 contours L3 L11 L1 L9 L7
sketch "Sketch25" plane through (-34.5, 57.9891, -21.4137) normal (0, 1, 0) x (1, 0, 0)
  circle A0 centre (34.5, 7.386) radius 1.1 projected
  line L0 (34.5, 6.286) -> (34.5, 5.286)
  line L1 (34.5, 3.5863) -> (34.5, 9.8863) projected
  line L2 (34.5, 5.286) -> (40.5, 5.286)
  line L3 (40.5, 5.286) -> (40.5, 3.5863)
  line L4 (63.6499, 3.5863) -> (5.3501, 3.5863) projected
  line L5 (40.5, 3.5863) -> (28.5, 3.5863)
  line L6 (28.5, 3.5863) -> (28.5, 5.286)
  line L7 (28.5, 5.286) -> (34.5, 5.286)
  point P0 (34.5, -21.4137)
  dimension "d144" = 1
  dimension "d145" = 6
  dimension "d146" = 12
extrude "Extrusion21" cut sketch "Sketch25" against normal blind 10 contours L2 L3 L4 L1 | L1 L4 L6 L7
sketch "Sketch26" plane through (0, 0, -25) normal (0, 0, 1) x (1, 0, 0)
  line L0 (-5, 2.5) -> (-31.9816, 49.2334) projected
  line L1 (-34.5, 49.2334) -> (-34.5, 53.5955) projected
  line L2 (-31.9816, 49.2334) -> (-34.5, 53.5955)
  line L3 (-31.9816, 49.2334) -> (-34.5, 49.2334) projected
  line L4 (-34.5, 53.5955) -> (-34.5, 49.2334)
  line L5 (-34.5, 49.2334) -> (-31.9816, 49.2334)
  point P0 (0, 0)
extrude "Extrusion22" cut sketch "Sketch26" against normal blind 10
sketch "Sketch27" plane through (0, 0, -25) normal (0, 0, 1) x (1, 0, 0)
  line L0 (31.9816, 49.2334) -> (36.5, 49.2334) projected
  line L1 (36.5, 57.0596) -> (38.75, 60.9567) projected
  line L2 (31.9816, 49.2334) -> (36.5, 57.0596)
  line L3 (36.5, 57.0596) -> (36.5, 49.2334)
  line L4 (36.5, 49.2334) -> (31.9816, 49.2334)
  point P0 (0, 0)
extrude "Extrusion23" cut sketch "Sketch27" against normal blind 10
sketch "Sketch28" plane through (0, 0, -25) normal (0, 0, -1) x (-1, 0, 0)
  line L0 (-36.5, 57.9891) -> (-36.5, 52.9891) projected
  line L1 (-36.5, 52.9891) -> (-34.1499, 52.9891) projected
  line L2 (-36.5, 52.9891) -> (-34.1499, 52.9891)
  line L3 (-36.5, 57.0596) -> (-34.1499, 52.9891) projected
  line L4 (-34.1499, 52.9891) -> (-36.5, 57.0596)
  line L5 (-36.5, 57.0596) -> (-36.5, 52.9891)
  point P0 (0, 0)
extrude "Extrusion24" add sketch "Sketch28" along normal up to surface (6.3 mm away)
properties part number "pelvis øvre del stor servo"
